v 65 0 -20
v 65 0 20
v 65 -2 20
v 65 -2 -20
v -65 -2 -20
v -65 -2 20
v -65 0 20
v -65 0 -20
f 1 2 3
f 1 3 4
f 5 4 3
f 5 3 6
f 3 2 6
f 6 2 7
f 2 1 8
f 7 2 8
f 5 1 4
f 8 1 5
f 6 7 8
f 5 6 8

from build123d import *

# Parameters (mm, degrees)
SKETCH002_W                = 65
SKETCH002_H                = 20
PAD001_DEPTH               = 2
SKETCH002_MIRRORED002_2_W  = 65
SKETCH002_MIRRORED002_2_H  = 20
PAD001_MIRRORED002_2_DEPTH = 2


with BuildPart() as part:
    # Sketch002 → Pad001 (new body)
    with BuildSketch(Plane.XZ):
        with Locations((32.5, 10)):
            Rectangle(SKETCH002_W, SKETCH002_H)
    pad001 = extrude(amount=PAD001_DEPTH)

    # Sketch002 Mirrored002 2 → Pad001 Mirrored002 2 (add)
    with BuildSketch(Plane(origin=(0, 0, 0), x_dir=(-1, 0, 0), z_dir=(0, 1, 0))):
        with Locations((32.5, 10)):
            Rectangle(SKETCH002_MIRRORED002_2_W, SKETCH002_MIRRORED002_2_H)
    pad001_mirrored002_2 = extrude(amount=-PAD001_MIRRORED002_2_DEPTH)

    # Mirrored003: Pad001, Pad001 Mirrored002 2 across Sketch002 H_Axis
    add(pad001.mirror(Plane(origin=(0, 0, 0), x_dir=(0, -1, 0), z_dir=(0, 0, 1))))
    add(pad001_mirrored002_2.mirror(Plane(origin=(0, 0, 0), x_dir=(0, -1, 0), z_dir=(0, 0, 1))))


solid = part.part
